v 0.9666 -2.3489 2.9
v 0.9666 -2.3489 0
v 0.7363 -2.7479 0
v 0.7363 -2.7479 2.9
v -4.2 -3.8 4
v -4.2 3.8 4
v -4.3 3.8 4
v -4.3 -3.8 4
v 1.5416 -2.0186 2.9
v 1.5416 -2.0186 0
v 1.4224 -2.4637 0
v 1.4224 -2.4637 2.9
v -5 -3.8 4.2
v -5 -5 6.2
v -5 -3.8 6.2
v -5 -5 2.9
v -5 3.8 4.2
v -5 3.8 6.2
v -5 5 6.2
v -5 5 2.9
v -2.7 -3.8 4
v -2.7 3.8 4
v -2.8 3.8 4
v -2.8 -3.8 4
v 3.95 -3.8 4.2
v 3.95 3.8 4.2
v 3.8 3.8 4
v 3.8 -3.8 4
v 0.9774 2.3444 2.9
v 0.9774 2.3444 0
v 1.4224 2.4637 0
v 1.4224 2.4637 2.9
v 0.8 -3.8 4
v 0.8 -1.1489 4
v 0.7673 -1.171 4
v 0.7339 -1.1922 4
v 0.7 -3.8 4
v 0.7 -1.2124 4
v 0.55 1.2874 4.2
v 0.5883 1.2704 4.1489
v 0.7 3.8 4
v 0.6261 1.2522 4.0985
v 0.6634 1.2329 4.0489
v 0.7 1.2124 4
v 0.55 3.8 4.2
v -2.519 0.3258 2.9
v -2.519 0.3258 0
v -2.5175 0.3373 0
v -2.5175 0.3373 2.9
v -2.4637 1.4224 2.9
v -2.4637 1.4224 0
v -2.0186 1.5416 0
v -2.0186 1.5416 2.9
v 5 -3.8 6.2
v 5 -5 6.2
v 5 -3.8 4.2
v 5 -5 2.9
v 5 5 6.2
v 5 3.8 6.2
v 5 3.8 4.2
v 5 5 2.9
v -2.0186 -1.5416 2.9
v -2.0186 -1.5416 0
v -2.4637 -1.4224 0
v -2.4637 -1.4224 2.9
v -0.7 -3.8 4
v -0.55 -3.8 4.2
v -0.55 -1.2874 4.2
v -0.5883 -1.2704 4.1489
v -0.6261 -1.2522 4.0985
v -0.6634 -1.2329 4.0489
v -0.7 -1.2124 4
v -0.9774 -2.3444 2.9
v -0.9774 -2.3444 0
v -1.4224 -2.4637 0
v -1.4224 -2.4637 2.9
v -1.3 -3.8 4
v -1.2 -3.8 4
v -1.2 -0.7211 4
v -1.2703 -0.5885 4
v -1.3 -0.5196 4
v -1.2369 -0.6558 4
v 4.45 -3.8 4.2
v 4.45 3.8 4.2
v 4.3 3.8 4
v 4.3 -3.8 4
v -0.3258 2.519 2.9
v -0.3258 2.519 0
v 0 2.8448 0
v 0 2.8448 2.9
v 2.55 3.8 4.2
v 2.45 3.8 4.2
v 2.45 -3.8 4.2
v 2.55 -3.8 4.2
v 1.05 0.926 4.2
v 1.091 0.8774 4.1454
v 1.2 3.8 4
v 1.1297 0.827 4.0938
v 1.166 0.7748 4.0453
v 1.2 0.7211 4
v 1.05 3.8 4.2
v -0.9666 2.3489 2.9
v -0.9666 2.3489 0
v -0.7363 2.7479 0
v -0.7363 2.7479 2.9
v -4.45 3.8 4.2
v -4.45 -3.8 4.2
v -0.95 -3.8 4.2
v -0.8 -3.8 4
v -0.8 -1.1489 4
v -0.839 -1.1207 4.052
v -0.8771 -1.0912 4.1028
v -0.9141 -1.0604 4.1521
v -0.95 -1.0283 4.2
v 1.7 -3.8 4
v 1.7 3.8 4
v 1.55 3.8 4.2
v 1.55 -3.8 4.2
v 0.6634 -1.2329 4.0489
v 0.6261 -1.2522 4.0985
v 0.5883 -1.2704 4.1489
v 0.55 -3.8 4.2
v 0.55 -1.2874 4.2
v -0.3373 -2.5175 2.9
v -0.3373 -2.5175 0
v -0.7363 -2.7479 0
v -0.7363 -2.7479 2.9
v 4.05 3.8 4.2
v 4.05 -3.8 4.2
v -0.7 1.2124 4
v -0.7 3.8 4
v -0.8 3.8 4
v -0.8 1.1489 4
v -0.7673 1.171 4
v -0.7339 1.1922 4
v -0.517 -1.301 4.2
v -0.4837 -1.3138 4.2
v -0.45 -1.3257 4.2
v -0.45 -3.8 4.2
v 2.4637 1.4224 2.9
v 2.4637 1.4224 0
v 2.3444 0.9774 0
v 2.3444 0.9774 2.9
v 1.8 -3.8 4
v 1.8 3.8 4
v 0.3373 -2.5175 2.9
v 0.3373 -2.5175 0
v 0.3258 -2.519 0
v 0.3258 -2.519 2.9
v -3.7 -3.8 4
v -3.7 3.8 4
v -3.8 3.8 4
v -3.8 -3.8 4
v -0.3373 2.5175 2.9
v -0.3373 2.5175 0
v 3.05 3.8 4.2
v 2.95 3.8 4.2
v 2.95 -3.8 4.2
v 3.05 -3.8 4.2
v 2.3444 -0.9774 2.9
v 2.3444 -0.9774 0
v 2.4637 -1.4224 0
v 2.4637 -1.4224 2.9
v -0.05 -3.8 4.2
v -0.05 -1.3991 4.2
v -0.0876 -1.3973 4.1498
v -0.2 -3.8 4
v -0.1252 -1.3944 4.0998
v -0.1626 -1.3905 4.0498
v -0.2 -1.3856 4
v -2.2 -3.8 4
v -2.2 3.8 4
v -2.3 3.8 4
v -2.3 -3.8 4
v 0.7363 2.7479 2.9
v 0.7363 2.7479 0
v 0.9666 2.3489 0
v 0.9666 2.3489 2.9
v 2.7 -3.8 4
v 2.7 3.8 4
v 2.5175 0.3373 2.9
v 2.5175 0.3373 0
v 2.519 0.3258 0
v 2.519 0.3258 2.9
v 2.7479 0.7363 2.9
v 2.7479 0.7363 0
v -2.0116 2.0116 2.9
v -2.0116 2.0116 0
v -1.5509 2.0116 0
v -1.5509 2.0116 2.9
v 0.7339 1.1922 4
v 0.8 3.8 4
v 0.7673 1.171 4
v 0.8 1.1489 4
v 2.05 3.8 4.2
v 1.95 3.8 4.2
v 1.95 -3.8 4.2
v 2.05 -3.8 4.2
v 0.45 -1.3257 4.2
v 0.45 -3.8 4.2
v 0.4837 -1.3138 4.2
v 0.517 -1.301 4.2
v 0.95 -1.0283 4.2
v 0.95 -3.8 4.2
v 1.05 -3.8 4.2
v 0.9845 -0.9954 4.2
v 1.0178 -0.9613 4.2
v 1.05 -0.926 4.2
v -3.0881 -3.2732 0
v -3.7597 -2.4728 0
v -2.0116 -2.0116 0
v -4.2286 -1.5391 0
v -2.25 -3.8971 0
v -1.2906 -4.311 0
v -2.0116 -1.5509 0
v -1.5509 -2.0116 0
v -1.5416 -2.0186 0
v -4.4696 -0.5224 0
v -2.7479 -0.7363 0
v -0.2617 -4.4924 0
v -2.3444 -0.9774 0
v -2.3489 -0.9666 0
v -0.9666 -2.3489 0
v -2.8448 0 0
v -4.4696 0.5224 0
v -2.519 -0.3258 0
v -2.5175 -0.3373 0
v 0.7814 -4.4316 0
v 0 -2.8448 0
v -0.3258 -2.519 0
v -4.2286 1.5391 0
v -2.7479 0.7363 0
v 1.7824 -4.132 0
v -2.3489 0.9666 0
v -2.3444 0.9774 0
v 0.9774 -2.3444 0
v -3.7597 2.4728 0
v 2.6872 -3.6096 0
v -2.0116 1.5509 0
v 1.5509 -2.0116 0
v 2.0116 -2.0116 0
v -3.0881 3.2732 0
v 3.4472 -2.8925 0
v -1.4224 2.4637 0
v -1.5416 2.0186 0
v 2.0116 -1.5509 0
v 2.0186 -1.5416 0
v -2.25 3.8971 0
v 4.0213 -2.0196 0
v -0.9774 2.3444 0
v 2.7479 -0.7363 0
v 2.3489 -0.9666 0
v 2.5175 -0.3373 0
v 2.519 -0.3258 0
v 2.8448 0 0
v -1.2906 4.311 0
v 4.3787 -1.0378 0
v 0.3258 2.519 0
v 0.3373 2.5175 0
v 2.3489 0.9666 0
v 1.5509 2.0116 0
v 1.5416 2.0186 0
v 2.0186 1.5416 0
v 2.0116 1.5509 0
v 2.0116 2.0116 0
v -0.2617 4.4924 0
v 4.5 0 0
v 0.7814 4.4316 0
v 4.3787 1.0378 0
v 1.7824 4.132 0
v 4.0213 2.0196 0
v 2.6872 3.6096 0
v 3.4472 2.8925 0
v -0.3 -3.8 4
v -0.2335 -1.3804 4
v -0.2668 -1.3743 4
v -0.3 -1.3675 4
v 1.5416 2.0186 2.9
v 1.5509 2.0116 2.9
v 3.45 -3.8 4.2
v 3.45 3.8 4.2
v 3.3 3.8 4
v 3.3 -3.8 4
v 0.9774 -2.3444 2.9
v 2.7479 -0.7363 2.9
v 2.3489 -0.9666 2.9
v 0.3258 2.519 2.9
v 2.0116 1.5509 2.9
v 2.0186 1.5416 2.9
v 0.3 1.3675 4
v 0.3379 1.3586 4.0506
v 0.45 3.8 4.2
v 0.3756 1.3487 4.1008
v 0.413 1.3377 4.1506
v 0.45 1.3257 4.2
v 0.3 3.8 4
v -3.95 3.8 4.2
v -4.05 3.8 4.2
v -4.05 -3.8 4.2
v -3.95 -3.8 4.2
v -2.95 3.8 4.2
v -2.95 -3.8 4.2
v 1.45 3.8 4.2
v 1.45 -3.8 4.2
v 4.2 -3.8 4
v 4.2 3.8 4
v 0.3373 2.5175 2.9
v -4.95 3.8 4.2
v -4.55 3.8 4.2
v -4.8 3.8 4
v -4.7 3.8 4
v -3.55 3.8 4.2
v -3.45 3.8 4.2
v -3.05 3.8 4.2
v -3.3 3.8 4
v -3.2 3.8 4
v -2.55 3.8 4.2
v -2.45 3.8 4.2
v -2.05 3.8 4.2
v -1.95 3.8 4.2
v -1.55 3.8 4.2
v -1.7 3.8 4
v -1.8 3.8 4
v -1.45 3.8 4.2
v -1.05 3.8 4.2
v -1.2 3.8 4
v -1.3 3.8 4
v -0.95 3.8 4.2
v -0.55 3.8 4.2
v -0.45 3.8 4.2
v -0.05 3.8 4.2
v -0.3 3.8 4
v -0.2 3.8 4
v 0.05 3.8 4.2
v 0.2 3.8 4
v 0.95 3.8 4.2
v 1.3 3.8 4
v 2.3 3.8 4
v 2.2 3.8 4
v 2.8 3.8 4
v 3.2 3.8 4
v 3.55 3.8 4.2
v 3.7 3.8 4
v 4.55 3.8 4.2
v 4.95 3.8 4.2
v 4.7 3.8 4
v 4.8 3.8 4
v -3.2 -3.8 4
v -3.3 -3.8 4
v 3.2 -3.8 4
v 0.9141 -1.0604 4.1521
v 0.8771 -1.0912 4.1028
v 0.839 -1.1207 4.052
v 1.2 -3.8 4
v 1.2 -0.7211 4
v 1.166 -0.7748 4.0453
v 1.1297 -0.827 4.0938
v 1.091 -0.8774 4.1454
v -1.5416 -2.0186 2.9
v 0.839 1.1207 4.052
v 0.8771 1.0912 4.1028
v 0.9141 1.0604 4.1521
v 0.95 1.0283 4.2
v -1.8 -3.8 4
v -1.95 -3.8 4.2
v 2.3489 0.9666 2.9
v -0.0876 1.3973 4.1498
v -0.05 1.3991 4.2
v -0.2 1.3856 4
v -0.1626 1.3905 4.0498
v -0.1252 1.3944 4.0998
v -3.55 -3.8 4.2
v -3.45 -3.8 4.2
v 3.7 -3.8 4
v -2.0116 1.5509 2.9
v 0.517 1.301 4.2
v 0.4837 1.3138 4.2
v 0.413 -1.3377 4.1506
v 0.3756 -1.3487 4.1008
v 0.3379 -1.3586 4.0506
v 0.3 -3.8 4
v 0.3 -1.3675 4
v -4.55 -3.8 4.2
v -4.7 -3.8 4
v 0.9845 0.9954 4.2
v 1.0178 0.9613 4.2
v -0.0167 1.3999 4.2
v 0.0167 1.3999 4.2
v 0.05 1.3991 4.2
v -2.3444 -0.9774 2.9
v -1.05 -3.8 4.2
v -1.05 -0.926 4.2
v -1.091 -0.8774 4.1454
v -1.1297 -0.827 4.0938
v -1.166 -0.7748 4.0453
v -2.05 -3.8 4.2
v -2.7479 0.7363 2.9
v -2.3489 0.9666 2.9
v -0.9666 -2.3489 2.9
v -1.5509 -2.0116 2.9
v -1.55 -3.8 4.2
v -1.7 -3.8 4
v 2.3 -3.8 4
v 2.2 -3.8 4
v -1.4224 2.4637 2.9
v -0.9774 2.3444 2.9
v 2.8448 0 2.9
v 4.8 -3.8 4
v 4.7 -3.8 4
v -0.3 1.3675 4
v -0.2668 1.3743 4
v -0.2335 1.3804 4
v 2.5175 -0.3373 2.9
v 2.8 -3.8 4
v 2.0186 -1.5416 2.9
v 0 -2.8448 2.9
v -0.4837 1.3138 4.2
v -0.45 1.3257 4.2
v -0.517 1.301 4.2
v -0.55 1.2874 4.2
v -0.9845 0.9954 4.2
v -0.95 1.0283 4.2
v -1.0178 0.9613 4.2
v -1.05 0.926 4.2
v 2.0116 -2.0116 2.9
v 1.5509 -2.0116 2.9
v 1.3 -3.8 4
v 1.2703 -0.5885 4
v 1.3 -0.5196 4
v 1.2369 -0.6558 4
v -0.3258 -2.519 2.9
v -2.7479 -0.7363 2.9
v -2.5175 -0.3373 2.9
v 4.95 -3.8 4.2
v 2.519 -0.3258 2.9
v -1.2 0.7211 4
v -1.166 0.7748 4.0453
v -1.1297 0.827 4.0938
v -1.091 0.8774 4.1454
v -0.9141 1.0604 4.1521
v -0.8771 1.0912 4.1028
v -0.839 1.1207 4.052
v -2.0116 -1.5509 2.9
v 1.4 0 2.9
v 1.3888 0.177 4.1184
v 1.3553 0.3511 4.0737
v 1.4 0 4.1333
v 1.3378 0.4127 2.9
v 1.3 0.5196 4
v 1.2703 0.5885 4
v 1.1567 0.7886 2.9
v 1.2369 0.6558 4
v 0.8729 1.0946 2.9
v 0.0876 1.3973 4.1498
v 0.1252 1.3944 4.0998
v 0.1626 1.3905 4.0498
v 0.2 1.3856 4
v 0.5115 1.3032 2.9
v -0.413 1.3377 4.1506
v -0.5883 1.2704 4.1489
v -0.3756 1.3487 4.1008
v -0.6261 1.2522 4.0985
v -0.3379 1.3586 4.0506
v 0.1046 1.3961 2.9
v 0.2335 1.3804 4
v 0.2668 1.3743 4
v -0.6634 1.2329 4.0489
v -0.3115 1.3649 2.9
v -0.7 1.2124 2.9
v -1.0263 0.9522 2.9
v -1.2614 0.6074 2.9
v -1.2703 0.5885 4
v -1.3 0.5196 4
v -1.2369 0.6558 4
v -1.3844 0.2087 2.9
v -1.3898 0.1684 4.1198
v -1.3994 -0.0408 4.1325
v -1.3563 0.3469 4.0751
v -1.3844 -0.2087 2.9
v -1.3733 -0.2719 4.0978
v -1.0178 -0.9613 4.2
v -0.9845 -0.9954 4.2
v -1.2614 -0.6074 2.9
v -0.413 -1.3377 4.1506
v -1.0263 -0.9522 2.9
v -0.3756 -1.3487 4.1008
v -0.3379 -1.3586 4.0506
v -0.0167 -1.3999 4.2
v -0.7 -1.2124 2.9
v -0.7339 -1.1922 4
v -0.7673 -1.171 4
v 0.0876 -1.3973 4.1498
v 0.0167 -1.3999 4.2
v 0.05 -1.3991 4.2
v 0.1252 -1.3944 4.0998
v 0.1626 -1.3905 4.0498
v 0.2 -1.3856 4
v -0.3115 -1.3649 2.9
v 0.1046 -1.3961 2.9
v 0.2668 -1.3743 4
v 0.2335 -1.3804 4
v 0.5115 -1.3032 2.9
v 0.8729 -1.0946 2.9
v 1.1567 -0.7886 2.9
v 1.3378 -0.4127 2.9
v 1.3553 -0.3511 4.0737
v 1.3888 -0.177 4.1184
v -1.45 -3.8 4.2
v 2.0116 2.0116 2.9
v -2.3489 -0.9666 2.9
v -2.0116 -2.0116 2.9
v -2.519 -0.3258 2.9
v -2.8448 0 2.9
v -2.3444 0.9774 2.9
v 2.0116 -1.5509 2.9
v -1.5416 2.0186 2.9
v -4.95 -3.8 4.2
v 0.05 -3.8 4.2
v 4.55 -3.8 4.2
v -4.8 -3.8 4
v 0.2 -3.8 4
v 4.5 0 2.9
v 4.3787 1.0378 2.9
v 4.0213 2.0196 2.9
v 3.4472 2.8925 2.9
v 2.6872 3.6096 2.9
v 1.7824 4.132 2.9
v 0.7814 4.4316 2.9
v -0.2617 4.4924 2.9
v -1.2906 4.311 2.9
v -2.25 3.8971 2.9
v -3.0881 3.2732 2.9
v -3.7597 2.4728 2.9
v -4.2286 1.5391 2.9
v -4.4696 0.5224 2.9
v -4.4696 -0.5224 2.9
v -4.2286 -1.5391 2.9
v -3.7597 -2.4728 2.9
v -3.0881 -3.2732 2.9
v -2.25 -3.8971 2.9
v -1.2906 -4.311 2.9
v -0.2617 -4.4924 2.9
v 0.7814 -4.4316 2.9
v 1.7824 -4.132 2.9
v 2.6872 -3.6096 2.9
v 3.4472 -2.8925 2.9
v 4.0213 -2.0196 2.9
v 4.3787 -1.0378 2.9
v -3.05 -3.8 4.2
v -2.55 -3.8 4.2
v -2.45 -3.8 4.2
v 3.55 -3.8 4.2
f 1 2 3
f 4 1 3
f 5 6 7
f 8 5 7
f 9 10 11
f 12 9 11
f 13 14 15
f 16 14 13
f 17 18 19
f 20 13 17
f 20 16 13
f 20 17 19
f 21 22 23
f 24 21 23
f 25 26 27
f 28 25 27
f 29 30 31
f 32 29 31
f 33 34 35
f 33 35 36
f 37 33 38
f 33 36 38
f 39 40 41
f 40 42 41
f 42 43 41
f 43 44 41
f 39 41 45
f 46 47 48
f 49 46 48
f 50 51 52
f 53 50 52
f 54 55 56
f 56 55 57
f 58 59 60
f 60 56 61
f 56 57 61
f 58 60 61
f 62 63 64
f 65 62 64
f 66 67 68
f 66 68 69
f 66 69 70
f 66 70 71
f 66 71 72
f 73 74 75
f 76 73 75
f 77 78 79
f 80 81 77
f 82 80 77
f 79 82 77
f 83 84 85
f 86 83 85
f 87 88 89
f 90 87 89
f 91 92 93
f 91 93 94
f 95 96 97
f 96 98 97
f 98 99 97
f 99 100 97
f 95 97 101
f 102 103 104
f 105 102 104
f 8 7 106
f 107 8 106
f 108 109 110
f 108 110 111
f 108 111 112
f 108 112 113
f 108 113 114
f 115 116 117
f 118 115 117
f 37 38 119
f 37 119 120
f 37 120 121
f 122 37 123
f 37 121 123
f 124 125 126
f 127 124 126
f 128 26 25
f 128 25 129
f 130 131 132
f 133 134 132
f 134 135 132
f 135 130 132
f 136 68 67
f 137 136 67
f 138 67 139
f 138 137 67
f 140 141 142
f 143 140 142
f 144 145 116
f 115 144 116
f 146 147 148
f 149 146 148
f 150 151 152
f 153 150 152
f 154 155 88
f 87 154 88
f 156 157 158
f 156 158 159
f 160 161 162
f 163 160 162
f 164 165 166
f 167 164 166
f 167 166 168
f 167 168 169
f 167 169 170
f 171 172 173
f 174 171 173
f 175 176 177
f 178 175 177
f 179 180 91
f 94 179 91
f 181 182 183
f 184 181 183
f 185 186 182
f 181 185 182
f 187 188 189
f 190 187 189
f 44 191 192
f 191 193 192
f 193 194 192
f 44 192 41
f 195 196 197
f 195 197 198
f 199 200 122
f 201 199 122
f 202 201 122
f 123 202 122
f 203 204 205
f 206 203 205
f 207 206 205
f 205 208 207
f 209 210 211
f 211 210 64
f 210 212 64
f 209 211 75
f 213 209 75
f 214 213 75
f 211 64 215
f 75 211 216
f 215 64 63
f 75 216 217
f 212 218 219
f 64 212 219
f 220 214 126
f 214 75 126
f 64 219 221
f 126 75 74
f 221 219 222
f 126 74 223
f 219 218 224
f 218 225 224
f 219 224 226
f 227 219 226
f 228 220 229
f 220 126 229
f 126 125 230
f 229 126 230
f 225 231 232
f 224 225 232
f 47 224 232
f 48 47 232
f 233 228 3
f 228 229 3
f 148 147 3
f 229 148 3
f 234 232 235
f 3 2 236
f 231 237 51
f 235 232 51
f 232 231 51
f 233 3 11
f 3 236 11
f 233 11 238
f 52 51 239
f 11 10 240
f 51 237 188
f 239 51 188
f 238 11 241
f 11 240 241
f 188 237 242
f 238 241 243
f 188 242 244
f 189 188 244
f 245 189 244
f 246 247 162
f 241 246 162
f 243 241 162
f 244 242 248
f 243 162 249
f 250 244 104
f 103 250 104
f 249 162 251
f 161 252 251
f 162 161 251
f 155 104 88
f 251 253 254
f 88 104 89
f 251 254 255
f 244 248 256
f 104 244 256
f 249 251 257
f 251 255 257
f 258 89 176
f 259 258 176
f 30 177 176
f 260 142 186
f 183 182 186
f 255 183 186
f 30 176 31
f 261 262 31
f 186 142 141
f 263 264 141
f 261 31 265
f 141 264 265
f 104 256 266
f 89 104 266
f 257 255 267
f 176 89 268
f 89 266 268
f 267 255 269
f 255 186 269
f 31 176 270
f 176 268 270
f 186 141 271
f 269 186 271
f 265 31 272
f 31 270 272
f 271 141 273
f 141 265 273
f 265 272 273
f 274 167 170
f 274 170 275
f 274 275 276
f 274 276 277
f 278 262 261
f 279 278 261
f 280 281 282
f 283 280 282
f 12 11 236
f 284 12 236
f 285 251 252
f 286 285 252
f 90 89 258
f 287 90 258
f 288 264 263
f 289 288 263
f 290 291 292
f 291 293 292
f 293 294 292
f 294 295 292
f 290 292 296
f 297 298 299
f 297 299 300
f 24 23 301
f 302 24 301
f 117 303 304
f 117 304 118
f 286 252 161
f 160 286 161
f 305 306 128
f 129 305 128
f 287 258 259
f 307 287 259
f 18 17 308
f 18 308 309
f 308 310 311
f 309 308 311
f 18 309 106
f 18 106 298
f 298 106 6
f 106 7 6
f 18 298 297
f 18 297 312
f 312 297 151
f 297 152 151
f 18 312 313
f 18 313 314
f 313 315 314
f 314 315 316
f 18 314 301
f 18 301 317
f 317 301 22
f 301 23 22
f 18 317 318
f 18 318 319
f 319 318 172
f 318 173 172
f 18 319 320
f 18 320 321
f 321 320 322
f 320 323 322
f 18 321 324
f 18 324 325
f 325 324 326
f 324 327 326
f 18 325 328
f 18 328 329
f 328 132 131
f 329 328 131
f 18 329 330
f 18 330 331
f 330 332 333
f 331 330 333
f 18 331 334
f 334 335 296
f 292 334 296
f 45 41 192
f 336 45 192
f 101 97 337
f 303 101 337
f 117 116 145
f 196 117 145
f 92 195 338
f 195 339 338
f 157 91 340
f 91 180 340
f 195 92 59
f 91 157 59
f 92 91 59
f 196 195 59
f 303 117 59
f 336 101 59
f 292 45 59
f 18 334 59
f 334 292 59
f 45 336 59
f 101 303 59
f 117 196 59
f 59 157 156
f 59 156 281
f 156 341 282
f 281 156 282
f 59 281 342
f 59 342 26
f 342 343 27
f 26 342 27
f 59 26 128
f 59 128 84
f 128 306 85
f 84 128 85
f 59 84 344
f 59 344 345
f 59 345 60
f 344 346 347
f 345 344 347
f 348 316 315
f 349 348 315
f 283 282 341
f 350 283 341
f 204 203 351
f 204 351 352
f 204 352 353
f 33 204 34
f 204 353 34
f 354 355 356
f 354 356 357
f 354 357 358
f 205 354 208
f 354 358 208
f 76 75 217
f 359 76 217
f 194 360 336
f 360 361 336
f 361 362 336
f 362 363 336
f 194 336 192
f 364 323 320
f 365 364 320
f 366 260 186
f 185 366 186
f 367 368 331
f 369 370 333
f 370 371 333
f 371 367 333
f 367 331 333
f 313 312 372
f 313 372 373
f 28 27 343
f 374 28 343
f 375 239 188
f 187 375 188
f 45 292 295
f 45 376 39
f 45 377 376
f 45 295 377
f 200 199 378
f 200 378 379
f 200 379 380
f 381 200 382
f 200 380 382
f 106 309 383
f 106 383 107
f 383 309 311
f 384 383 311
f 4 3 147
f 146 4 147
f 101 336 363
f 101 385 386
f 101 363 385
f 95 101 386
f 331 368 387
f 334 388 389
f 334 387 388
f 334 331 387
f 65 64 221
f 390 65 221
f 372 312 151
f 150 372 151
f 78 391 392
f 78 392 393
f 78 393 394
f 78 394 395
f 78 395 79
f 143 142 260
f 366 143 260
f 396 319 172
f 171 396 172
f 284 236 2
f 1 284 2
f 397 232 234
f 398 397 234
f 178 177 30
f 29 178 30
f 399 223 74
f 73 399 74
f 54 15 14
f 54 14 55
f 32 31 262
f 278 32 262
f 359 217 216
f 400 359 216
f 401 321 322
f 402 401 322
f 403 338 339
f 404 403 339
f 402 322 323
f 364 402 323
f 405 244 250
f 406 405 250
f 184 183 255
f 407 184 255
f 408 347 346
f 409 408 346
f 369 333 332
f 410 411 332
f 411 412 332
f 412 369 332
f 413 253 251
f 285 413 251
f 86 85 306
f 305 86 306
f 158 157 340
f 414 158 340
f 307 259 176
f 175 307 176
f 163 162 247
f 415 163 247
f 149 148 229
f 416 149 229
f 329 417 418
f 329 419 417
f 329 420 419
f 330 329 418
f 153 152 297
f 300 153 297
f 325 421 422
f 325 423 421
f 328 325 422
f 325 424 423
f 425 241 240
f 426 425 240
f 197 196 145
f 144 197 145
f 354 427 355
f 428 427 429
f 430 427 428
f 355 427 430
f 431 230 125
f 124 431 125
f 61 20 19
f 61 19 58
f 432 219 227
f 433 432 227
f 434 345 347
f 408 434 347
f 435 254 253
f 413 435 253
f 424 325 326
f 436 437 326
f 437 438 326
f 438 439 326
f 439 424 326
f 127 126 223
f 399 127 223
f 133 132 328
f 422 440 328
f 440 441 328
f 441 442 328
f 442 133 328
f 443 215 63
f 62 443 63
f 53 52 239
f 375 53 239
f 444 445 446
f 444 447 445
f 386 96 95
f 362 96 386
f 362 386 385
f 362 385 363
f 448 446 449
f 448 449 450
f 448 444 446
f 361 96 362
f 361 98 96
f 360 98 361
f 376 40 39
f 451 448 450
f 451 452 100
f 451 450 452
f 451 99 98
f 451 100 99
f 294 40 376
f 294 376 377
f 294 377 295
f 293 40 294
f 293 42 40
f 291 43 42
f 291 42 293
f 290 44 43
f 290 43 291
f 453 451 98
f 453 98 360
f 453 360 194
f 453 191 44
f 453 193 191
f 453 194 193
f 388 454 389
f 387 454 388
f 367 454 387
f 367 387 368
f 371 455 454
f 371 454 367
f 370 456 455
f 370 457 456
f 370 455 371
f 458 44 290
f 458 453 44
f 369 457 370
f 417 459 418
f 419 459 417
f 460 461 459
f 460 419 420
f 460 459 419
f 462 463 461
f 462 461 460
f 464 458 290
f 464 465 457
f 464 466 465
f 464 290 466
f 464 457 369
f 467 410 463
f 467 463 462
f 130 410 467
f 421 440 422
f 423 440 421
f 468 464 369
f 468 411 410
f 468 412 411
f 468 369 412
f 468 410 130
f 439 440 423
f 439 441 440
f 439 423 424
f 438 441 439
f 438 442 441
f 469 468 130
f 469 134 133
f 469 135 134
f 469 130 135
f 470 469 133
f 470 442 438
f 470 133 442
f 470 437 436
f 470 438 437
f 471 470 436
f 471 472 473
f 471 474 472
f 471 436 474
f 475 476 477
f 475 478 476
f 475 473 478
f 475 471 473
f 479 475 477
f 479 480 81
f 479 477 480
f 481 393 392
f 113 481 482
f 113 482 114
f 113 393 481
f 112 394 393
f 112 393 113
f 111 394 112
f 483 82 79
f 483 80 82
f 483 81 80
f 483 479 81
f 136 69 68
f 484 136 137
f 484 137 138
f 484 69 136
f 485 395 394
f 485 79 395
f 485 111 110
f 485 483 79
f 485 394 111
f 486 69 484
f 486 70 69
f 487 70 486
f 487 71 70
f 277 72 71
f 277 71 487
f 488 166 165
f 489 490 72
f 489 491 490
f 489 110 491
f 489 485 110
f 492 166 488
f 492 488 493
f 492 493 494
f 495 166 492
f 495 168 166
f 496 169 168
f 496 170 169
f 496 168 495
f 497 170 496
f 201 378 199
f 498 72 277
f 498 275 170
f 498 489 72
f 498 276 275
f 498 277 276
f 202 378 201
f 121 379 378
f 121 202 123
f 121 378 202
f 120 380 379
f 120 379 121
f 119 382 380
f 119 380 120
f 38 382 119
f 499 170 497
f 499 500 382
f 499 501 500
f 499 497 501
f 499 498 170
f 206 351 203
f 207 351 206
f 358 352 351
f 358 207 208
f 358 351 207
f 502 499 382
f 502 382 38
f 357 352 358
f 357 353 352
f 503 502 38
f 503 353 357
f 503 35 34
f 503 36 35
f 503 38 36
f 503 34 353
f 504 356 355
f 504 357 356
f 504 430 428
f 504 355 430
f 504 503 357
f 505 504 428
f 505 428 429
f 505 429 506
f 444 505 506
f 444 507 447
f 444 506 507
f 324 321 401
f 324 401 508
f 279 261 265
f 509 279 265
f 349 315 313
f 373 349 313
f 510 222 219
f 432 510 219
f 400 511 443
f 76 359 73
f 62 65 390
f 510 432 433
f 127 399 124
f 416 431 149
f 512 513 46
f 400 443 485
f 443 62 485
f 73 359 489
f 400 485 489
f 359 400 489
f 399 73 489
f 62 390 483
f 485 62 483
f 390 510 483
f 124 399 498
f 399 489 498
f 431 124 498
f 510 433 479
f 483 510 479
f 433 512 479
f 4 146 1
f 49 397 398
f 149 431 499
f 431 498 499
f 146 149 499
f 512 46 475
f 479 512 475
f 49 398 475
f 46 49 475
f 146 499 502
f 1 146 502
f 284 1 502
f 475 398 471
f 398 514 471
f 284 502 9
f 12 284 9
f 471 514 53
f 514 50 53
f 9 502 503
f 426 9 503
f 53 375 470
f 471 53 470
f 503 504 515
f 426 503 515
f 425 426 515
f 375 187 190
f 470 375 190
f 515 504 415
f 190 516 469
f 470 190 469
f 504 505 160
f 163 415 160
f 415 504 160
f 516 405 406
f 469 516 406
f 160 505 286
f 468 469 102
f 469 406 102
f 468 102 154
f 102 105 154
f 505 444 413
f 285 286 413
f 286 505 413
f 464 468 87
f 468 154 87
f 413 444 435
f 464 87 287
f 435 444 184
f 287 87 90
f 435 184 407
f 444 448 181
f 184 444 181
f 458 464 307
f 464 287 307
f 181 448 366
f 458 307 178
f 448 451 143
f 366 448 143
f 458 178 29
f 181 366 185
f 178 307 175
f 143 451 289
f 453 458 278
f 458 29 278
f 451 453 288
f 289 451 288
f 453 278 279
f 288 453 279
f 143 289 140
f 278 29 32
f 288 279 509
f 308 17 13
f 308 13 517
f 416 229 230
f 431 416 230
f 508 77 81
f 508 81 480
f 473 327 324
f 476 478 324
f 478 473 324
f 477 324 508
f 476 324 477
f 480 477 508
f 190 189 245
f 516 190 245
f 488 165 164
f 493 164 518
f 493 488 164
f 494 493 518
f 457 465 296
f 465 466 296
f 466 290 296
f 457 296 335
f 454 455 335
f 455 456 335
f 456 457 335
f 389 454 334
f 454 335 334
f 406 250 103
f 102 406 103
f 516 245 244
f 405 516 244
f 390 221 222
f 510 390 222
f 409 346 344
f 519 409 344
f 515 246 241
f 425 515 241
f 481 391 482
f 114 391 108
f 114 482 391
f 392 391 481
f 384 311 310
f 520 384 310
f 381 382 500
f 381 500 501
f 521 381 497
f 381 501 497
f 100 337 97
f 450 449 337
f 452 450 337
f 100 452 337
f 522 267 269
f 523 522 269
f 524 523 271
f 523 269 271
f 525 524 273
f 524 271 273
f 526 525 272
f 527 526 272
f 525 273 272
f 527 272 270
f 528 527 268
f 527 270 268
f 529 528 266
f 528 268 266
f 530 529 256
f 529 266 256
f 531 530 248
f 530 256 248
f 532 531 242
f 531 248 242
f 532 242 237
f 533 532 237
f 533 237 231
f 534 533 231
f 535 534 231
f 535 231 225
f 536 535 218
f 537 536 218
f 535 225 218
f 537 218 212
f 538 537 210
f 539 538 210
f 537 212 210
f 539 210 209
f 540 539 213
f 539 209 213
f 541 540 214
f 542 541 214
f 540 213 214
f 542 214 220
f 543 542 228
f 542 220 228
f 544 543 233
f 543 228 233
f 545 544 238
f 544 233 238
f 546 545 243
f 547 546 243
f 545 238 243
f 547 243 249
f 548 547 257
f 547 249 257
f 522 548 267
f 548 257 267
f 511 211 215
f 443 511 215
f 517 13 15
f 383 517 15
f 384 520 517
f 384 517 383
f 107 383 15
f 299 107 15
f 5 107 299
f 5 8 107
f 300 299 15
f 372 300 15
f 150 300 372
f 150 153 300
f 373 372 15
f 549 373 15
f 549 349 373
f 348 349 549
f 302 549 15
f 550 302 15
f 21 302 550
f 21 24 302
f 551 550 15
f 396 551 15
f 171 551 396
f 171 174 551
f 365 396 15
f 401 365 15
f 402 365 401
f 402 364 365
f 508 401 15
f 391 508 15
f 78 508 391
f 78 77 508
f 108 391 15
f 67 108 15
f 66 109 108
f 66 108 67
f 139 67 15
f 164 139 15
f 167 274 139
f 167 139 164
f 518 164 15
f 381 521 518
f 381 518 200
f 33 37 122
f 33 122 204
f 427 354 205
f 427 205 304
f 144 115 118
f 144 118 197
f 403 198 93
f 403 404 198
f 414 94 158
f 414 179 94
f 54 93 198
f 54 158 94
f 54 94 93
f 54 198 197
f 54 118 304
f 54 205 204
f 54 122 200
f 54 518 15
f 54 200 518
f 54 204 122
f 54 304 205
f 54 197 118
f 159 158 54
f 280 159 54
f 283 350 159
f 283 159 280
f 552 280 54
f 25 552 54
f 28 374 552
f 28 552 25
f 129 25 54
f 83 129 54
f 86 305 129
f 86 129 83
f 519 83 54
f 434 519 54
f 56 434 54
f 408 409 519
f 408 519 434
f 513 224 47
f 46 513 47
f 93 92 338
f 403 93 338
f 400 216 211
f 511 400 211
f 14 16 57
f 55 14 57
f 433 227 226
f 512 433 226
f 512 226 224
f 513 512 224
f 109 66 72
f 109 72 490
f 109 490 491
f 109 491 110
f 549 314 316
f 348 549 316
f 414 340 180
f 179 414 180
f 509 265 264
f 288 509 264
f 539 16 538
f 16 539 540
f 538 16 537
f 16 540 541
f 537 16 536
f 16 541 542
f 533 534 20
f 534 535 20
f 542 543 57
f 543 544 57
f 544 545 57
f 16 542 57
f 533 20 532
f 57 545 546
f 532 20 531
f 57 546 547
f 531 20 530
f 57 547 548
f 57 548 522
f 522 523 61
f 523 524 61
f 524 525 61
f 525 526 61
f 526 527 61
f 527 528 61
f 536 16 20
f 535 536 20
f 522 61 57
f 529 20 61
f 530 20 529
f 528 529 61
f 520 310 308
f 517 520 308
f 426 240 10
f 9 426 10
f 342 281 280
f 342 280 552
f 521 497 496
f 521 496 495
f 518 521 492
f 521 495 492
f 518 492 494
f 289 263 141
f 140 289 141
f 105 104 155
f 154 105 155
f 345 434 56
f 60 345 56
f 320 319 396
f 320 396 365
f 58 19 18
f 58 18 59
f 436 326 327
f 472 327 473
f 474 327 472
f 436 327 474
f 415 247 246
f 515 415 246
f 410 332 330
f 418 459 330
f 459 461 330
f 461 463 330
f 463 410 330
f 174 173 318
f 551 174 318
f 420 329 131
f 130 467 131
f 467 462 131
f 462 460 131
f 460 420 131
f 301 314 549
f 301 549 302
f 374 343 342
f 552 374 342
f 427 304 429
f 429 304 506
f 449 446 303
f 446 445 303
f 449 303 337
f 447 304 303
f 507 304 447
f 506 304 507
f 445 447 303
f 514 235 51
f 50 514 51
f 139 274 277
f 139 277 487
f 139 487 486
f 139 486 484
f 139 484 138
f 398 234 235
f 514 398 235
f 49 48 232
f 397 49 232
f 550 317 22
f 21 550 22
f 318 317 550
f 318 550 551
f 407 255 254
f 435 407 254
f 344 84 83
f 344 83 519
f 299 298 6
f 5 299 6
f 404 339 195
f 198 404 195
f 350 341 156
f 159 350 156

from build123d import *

# Parameters (mm, degrees)
ESQUISSE1_R                = 4.5
BOSS_EXTRU_1_DEPTH         = 2.9
ESQUISSE2_W                = 10
ESQUISSE2_H                = 10
ESQUISSE2_R                = 1.4
BOSS_EXTRU_2_DEPTH         = 1.3
ESQUISSE3_W                = 10
ESQUISSE3_H                = 1.2
BOSS_EXTRU_3_DEPTH         = 2
ENL_V_MAT_EXTRU_1_DEPTH    = 7.6
R_P_TITION_LIN_AIRE4_COUNT = 20
R_P_TITION_LIN_AIRE4_PITCH = 0.5


with BuildPart() as part:
    # Esquisse1 → Boss.-Extru.1 (new body)
    with BuildSketch(Plane.XY):
        Circle(ESQUISSE1_R)
        Polygon((2.011577371, -1.550856692), (2.011577371, -2.011577371), (1.550856692, -2.011577371), (1.541643286, -2.018647066), (1.4224, -2.463669069), (0.977377998, -2.344425783), (0.966648759, -2.348869979), (0.73628842, -2.747865791), (0.337292608, -2.517505451), (0.325778716, -2.519021284), (0, -2.8448), (-0.325778716, -2.519021284), (-0.337292608, -2.517505451), (-0.73628842, -2.747865791), (-0.966648759, -2.348869979), (-0.977377998, -2.344425783), (-1.4224, -2.463669069), (-1.541643286, -2.018647066), (-1.550856692, -2.011577371), (-2.011577371, -2.011577371), (-2.011577371, -1.550856692), (-2.018647066, -1.541643286), (-2.463669069, -1.4224), (-2.344425783, -0.977377998), (-2.348869979, -0.966648759), (-2.747865791, -0.73628842), (-2.517505451, -0.337292608), (-2.519021284, -0.325778716), (-2.8448, 0), (-2.519021284, 0.325778716), (-2.517505451, 0.337292608), (-2.747865791, 0.73628842), (-2.348869979, 0.966648759), (-2.344425783, 0.977377998), (-2.463669069, 1.4224), (-2.018647066, 1.541643286), (-2.011577371, 1.550856692), (-2.011577371, 2.011577371), (-1.550856692, 2.011577371), (-1.541643286, 2.018647066), (-1.4224, 2.463669069), (-0.977377998, 2.344425783), (-0.966648759, 2.348869979), (-0.73628842, 2.747865791), (-0.337292608, 2.517505451), (-0.325778716, 2.519021284), (0, 2.8448), (0.325778716, 2.519021284), (0.337292608, 2.517505451), (0.73628842, 2.747865791), (0.966648759, 2.348869979), (0.977377998, 2.344425783), (1.4224, 2.463669069), (1.541643286, 2.018647066), (1.550856692, 2.011577371), (2.011577371, 2.011577371), (2.011577371, 1.550856692), (2.018647066, 1.541643286), (2.463669069, 1.4224), (2.344425783, 0.977377998), (2.348869979, 0.966648759), (2.747865791, 0.73628842), (2.517505451, 0.337292608), (2.519021284, 0.325778716), (2.8448, 0), (2.519021284, -0.325778716), (2.517505451, -0.337292608), (2.747865791, -0.73628842), (2.348869979, -0.966648759), (2.344425783, -0.977377998), (2.463669069, -1.4224), (2.018647066, -1.541643286), align=None, mode=Mode.SUBTRACT)
    extrude(amount=BOSS_EXTRU_1_DEPTH)

    # Esquisse2 → Boss.-Extru.2 (add)
    with BuildSketch(Plane.XY.offset(2.9)):
        Rectangle(ESQUISSE2_W, ESQUISSE2_H)
        Circle(ESQUISSE2_R, mode=Mode.SUBTRACT)
    extrude(amount=BOSS_EXTRU_2_DEPTH)

    # Esquisse3 → Boss.-Extru.3 (add)
    with BuildSketch(Plane.XY.offset(4.2)):
        with Locations((0, 4.4)):
            Rectangle(ESQUISSE3_W, ESQUISSE3_H)
        with Locations((0, -4.4)):
            Rectangle(ESQUISSE3_W, ESQUISSE3_H)
    extrude(amount=BOSS_EXTRU_3_DEPTH)

    # Esquisse4 → Enlèv. mat.-Extru.1 (cut)
    with BuildSketch(Plane.XZ.offset(-3.8)):
        Polygon((-4.55, 4.2), (-4.7, 4), (-4.8, 4), (-4.95, 4.2), align=None)
    enl_v_mat_extru_1 = extrude(amount=ENL_V_MAT_EXTRU_1_DEPTH, mode=Mode.SUBTRACT)

    # Répétition linéaire4: Enlèv. mat.-Extru.1 ×20
    with Locations(*[(i * R_P_TITION_LIN_AIRE4_PITCH, 0, 0) for i in range(1, R_P_TITION_LIN_AIRE4_COUNT)]):
        add(enl_v_mat_extru_1, mode=Mode.SUBTRACT)


solid = part.part
